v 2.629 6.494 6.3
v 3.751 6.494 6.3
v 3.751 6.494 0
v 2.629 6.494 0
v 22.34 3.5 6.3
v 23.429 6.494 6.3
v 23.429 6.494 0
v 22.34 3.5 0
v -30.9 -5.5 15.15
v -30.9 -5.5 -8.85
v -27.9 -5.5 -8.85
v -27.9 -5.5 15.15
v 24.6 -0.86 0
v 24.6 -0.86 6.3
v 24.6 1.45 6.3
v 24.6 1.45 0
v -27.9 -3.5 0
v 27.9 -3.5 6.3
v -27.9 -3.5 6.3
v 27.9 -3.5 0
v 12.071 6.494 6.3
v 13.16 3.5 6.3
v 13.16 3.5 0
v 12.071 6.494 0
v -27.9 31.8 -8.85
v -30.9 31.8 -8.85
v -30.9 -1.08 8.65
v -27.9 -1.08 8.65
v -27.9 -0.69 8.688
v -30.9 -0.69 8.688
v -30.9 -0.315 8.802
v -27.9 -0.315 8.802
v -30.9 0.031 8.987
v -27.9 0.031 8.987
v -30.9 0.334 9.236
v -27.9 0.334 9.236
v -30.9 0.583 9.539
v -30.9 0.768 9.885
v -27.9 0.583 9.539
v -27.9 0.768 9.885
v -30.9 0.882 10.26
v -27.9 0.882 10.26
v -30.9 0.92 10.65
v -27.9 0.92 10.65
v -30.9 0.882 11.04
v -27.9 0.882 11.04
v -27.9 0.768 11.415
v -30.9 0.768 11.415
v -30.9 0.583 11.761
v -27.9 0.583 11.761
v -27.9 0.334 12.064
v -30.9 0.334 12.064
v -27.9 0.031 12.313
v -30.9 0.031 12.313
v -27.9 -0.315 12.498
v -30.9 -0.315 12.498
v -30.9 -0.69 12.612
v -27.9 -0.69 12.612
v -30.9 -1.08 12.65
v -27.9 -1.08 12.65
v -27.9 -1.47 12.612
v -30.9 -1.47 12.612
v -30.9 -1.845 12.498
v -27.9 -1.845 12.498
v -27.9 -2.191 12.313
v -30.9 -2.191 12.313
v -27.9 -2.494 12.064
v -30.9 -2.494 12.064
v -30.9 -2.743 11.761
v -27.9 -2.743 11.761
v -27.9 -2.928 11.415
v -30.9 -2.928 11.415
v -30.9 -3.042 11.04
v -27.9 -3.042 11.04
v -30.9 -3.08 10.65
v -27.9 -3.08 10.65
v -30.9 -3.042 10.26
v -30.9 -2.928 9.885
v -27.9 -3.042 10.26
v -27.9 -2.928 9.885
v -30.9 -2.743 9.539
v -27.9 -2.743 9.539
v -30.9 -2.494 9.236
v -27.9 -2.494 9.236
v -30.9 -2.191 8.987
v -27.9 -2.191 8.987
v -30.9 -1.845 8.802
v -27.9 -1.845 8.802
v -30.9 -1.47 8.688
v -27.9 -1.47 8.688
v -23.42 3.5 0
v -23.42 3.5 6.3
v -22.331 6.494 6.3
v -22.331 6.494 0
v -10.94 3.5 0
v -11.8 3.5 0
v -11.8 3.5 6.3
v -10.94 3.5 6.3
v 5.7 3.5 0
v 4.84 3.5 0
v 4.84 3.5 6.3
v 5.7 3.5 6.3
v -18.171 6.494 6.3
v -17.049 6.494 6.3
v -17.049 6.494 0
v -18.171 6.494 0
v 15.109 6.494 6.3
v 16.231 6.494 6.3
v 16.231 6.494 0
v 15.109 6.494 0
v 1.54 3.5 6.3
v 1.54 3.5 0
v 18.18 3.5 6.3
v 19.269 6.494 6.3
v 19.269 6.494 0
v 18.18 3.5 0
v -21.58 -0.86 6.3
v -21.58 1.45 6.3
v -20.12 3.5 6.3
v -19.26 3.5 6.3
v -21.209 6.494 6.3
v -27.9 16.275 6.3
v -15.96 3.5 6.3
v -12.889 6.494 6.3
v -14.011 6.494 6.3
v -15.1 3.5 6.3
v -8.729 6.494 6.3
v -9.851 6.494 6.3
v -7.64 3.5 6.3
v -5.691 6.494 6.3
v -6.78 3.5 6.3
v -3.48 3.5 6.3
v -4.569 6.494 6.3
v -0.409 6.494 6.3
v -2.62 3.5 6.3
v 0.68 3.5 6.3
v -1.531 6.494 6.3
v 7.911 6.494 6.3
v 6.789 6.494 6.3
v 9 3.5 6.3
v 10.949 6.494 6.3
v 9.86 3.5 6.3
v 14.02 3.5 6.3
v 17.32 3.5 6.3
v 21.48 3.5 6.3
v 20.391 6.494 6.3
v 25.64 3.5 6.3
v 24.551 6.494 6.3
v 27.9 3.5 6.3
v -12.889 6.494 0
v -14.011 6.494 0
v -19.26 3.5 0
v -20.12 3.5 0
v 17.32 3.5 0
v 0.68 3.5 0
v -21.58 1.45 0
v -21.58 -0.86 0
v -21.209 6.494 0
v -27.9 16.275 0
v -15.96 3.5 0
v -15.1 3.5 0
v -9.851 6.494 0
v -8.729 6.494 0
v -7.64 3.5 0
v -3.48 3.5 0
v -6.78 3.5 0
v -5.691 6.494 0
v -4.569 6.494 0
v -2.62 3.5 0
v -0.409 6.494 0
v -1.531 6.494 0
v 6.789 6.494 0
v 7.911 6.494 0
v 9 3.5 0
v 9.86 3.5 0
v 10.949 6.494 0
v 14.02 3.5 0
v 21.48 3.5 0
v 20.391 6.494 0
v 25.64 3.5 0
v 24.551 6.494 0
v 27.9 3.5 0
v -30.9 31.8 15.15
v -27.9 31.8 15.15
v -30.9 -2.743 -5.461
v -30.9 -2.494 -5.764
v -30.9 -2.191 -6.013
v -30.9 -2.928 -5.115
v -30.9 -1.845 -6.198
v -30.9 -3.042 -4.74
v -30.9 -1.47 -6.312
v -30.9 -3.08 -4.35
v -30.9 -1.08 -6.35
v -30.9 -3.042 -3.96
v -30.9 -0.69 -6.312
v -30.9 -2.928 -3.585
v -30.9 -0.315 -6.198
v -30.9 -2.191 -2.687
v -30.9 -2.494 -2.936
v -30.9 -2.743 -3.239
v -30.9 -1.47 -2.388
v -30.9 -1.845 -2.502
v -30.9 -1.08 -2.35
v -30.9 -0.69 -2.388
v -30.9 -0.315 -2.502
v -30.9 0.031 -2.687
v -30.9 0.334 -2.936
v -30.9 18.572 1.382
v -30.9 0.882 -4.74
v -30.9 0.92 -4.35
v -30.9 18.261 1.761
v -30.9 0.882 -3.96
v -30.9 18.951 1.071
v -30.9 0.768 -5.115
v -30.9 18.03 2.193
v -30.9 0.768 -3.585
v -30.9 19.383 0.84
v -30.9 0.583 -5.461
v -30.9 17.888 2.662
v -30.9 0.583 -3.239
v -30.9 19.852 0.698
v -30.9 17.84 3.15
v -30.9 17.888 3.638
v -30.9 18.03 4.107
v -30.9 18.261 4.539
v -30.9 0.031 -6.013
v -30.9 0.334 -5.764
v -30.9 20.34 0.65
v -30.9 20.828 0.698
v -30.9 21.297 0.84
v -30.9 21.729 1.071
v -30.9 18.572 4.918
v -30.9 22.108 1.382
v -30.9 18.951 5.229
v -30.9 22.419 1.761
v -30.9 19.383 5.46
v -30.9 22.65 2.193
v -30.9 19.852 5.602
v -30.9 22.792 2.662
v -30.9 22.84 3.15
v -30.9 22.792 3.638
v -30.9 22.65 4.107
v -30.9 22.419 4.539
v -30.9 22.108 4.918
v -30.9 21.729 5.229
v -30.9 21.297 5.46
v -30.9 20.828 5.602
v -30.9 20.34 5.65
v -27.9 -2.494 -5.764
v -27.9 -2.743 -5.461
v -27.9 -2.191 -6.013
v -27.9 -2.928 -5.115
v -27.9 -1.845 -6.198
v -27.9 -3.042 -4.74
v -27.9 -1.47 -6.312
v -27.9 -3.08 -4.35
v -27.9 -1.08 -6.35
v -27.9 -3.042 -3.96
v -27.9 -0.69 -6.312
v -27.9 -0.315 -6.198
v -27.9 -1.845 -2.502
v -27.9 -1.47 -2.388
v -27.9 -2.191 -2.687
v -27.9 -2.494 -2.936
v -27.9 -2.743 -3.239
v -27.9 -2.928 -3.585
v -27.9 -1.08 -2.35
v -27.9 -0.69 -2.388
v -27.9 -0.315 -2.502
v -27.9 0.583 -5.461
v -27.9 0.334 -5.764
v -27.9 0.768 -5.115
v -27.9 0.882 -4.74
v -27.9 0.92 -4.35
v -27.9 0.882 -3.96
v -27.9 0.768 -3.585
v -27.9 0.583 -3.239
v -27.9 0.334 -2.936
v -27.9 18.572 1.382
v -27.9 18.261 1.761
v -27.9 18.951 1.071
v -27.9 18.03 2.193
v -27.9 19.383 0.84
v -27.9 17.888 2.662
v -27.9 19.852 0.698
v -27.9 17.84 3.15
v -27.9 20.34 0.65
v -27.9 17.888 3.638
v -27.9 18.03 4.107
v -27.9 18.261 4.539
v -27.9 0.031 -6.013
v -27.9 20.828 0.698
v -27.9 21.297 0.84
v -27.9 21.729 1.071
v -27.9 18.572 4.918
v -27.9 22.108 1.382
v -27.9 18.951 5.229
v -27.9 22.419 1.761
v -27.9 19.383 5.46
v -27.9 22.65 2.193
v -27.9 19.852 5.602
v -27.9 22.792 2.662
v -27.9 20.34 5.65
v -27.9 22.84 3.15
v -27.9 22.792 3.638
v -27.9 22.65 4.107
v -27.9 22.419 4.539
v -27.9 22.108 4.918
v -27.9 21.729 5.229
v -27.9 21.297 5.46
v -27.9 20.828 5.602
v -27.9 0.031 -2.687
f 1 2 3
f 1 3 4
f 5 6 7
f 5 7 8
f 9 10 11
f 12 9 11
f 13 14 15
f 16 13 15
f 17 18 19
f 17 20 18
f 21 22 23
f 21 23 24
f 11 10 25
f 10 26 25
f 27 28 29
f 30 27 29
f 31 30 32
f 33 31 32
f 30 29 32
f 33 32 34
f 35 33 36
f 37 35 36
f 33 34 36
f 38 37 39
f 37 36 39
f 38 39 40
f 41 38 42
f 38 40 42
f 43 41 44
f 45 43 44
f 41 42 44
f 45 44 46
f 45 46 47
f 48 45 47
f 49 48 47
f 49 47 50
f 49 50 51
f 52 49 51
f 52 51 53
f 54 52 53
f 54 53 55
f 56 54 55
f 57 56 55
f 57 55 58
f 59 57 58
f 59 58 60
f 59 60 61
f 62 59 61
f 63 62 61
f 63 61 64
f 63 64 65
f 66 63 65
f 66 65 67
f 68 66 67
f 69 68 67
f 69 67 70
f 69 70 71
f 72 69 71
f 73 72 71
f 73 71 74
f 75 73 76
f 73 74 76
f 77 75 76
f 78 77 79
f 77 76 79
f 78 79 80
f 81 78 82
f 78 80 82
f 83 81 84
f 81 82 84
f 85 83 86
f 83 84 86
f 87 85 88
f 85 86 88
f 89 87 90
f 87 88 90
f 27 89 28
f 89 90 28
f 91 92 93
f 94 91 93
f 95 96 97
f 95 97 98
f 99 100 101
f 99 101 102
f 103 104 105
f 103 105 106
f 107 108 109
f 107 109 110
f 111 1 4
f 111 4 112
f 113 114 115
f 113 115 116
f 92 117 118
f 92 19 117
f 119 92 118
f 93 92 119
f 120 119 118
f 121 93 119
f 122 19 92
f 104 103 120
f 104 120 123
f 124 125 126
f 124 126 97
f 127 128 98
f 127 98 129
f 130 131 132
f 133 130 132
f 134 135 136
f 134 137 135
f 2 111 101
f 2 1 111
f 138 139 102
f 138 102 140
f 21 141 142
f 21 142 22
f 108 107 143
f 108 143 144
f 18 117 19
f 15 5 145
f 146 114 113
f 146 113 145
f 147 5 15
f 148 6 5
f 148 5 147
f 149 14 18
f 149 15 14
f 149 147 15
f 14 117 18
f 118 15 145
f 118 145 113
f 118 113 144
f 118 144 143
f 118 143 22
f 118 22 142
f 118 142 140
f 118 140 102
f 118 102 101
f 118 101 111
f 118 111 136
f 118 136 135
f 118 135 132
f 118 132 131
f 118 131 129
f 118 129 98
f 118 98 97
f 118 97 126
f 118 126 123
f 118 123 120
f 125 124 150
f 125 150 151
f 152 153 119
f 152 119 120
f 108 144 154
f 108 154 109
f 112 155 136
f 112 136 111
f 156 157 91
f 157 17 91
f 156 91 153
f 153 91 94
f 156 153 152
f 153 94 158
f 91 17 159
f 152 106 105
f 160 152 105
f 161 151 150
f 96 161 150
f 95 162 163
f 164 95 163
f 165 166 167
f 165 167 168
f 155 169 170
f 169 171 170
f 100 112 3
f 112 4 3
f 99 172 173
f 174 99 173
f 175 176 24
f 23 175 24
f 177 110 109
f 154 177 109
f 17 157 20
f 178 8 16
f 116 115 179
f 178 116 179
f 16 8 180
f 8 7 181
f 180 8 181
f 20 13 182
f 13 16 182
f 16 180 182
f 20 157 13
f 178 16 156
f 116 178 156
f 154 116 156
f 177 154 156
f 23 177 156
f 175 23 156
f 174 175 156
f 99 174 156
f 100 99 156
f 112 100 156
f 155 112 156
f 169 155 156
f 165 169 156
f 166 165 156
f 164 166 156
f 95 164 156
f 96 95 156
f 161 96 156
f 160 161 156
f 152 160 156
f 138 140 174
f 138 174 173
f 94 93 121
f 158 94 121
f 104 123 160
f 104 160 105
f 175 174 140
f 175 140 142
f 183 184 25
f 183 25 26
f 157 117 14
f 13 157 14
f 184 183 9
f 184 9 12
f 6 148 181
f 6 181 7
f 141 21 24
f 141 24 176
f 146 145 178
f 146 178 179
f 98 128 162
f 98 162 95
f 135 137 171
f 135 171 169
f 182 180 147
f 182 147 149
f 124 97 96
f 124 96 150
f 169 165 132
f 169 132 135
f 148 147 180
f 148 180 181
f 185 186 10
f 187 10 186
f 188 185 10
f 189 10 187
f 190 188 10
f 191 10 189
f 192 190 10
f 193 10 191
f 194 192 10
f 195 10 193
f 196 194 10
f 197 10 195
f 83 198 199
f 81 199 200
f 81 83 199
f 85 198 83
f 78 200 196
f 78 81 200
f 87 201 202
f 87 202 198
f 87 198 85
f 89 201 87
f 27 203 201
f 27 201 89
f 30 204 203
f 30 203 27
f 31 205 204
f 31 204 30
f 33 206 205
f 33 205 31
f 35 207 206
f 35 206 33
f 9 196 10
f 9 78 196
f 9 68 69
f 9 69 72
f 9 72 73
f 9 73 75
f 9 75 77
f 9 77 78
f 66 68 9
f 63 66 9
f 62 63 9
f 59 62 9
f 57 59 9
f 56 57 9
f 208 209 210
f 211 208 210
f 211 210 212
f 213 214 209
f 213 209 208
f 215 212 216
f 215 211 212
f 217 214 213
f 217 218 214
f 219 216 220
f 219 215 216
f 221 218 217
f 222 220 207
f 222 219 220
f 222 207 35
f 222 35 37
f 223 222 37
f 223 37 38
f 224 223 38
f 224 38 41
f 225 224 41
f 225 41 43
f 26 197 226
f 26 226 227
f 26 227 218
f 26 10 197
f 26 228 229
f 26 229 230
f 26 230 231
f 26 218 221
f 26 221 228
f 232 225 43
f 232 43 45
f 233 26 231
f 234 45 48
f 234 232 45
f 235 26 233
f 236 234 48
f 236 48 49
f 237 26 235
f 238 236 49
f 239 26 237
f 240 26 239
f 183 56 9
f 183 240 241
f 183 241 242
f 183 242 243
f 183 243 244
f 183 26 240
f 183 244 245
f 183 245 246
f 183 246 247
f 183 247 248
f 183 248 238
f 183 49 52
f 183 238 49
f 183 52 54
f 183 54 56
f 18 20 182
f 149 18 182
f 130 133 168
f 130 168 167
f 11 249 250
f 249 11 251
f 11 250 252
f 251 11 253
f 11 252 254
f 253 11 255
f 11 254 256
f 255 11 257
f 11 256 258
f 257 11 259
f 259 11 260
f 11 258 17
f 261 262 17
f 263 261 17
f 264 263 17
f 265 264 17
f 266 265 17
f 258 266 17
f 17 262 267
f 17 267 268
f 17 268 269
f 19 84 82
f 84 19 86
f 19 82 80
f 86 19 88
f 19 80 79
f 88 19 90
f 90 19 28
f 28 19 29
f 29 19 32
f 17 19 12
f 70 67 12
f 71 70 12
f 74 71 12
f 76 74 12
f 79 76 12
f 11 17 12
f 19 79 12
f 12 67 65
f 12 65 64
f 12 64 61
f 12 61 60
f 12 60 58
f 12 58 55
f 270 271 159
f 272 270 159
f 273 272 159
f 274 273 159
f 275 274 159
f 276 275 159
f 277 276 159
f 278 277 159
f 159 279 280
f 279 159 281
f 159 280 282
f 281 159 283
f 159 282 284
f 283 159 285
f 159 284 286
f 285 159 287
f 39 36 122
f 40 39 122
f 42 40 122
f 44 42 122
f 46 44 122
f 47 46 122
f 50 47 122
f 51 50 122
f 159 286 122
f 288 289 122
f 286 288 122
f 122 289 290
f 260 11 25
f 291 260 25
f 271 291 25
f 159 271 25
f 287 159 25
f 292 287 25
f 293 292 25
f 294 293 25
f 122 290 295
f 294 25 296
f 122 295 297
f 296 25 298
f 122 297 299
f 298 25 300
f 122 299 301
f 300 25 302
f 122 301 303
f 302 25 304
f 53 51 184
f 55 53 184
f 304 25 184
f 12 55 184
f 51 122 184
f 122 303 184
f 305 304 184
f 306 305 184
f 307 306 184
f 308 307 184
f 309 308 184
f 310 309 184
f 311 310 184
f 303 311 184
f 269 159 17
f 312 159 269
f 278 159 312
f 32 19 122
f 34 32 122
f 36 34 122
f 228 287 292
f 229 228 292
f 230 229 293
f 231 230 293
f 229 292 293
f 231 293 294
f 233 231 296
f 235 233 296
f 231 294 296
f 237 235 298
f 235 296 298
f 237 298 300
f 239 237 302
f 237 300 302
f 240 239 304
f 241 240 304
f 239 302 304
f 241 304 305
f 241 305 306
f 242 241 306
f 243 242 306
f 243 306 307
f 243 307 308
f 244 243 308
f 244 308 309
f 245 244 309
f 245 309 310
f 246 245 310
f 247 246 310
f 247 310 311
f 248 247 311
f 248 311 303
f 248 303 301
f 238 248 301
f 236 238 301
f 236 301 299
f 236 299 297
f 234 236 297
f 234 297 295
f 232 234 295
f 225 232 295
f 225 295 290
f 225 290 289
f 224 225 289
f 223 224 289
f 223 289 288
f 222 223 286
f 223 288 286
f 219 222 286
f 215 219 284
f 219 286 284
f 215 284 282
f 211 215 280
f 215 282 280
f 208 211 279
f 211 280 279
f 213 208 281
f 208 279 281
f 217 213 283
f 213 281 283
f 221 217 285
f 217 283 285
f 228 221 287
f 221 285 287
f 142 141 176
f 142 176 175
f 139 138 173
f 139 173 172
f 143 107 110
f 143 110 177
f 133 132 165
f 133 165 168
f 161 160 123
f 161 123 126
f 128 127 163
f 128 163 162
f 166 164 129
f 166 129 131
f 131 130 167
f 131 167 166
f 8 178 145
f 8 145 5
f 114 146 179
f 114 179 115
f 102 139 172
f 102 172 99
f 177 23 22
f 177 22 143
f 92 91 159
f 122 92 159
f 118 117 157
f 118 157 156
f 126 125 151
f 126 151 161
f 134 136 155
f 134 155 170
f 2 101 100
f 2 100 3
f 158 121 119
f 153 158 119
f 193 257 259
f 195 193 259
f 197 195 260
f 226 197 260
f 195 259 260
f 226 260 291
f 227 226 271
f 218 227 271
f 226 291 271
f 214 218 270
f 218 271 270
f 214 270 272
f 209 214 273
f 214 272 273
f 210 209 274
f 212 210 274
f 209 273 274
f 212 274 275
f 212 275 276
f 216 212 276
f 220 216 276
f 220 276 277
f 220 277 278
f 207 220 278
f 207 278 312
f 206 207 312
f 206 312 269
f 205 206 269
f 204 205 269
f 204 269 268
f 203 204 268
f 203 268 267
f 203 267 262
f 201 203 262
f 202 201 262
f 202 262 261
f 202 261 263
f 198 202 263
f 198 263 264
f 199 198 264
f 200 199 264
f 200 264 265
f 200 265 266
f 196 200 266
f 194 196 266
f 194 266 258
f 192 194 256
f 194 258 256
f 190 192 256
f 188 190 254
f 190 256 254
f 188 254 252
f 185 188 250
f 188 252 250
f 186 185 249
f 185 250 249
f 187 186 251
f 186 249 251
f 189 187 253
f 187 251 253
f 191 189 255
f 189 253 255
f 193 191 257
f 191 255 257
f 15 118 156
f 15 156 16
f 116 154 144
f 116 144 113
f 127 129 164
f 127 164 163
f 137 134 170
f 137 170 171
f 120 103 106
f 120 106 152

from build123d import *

# Parameters (mm, degrees)
SKETCH1_W           = 55.8
SKETCH1_H           = 7
BOSS_EXTRUDE2_DEPTH = 6.3
SKETCH2_W           = 46.18
SKETCH2_H           = 2.31
CUT_EXTRUDE1_DEPTH  = 6.3
BOSS_EXTRUDE3_DEPTH = 6.3
SKETCH5_W           = 3
SKETCH5_H           = 24
BOSS_EXTRUDE4_DEPTH = 35.3
SKETCH6_R           = 2
SKETCH6_R_2         = 2.5
CUT_EXTRUDE2_DEPTH  = 40
BOSS_EXTRUDE5_DEPTH = 6.3
SKETCH8_W           = 3
SKETCH8_H           = 24
BOSS_EXTRUDE6_DEPTH = 2


with BuildPart() as part:
    # Sketch1 → Boss-Extrude2 (new body)
    with BuildSketch(Plane.XY):
        Rectangle(SKETCH1_W, SKETCH1_H)
    extrude(amount=BOSS_EXTRUDE2_DEPTH)

    # Sketch2 → Cut-Extrude1 (cut)
    with BuildSketch(Plane.XY.offset(6.3)):
        with Locations((1.51, 0.295)):
            Rectangle(SKETCH2_W, SKETCH2_H)
    extrude(amount=-CUT_EXTRUDE1_DEPTH, mode=Mode.SUBTRACT)

    # Sketch3 → Boss-Extrude3 (add)
    with BuildSketch(Plane.XY.offset(6.3)):
        Polygon((-23.42, 3.5), (-22.331, 6.494), (-21.209, 6.494), (-20.12, 3.5), align=None)
        Polygon((-19.26, 3.5), (-15.96, 3.5), (-17.049, 6.494), (-18.171, 6.494), align=None)
        Polygon((-15.1, 3.5), (-11.8, 3.5), (-12.889, 6.494), (-14.011, 6.494), align=None)
        Polygon((-10.94, 3.5), (-7.64, 3.5), (-8.729, 6.494), (-9.851, 6.494), align=None)
        Polygon((-6.78, 3.5), (-3.48, 3.5), (-4.569, 6.494), (-5.691, 6.494), align=None)
        Polygon((-2.62, 3.5), (0.68, 3.5), (-0.409, 6.494), (-1.531, 6.494), align=None)
        Polygon((1.54, 3.5), (4.84, 3.5), (3.751, 6.494), (2.629, 6.494), align=None)
        Polygon((5.7, 3.5), (9, 3.5), (7.911, 6.494), (6.789, 6.494), align=None)
        Polygon((9.86, 3.5), (13.16, 3.5), (12.071, 6.494), (10.949, 6.494), align=None)
        Polygon((14.02, 3.5), (17.32, 3.5), (16.231, 6.494), (15.109, 6.494), align=None)
        Polygon((18.18, 3.5), (21.48, 3.5), (20.391, 6.494), (19.269, 6.494), align=None)
        Polygon((22.34, 3.5), (25.64, 3.5), (24.551, 6.494), (23.429, 6.494), align=None)
    extrude(amount=-BOSS_EXTRUDE3_DEPTH)

    # Sketch5 → Boss-Extrude4 (add)
    with BuildSketch(Plane(origin=(0, -3.5, 0), x_dir=(-1, 0, 0), z_dir=(0, -1, 0))):
        with Locations((29.4, -3.15)):
            Rectangle(SKETCH5_W, SKETCH5_H)
    extrude(amount=-BOSS_EXTRUDE4_DEPTH)

    # Sketch6 → Cut-Extrude2 (cut)
    with BuildSketch(Plane(origin=(-27.9, 0, 0), x_dir=(0, 0, -1), z_dir=(1, 0, 0))):
        with Locations((4.35, -1.08)):
            Circle(SKETCH6_R)
        with Locations((-10.65, -1.08)):
            Circle(SKETCH6_R)
        with Locations((-3.15, 20.34)):
            Circle(SKETCH6_R_2)
    extrude(amount=-CUT_EXTRUDE2_DEPTH, mode=Mode.SUBTRACT)

    # Sketch7 → Boss-Extrude5 (add)
    with BuildSketch(Plane(origin=(0, 0, 0), x_dir=(-1, 0, 0), z_dir=(0, 0, -1))):
        Polygon((23.42, 3.5), (27.9, 16.274768446), (27.9, 8.809175652), (27.9, 3.5), align=None)
    extrude(amount=-BOSS_EXTRUDE5_DEPTH)

    # Sketch8 → Boss-Extrude6 (add)
    with BuildSketch(Plane.XZ.offset(3.5)):
        with Locations((-29.4, 3.15)):
            Rectangle(SKETCH8_W, SKETCH8_H)
    extrude(amount=BOSS_EXTRUDE6_DEPTH)


solid = part.part
